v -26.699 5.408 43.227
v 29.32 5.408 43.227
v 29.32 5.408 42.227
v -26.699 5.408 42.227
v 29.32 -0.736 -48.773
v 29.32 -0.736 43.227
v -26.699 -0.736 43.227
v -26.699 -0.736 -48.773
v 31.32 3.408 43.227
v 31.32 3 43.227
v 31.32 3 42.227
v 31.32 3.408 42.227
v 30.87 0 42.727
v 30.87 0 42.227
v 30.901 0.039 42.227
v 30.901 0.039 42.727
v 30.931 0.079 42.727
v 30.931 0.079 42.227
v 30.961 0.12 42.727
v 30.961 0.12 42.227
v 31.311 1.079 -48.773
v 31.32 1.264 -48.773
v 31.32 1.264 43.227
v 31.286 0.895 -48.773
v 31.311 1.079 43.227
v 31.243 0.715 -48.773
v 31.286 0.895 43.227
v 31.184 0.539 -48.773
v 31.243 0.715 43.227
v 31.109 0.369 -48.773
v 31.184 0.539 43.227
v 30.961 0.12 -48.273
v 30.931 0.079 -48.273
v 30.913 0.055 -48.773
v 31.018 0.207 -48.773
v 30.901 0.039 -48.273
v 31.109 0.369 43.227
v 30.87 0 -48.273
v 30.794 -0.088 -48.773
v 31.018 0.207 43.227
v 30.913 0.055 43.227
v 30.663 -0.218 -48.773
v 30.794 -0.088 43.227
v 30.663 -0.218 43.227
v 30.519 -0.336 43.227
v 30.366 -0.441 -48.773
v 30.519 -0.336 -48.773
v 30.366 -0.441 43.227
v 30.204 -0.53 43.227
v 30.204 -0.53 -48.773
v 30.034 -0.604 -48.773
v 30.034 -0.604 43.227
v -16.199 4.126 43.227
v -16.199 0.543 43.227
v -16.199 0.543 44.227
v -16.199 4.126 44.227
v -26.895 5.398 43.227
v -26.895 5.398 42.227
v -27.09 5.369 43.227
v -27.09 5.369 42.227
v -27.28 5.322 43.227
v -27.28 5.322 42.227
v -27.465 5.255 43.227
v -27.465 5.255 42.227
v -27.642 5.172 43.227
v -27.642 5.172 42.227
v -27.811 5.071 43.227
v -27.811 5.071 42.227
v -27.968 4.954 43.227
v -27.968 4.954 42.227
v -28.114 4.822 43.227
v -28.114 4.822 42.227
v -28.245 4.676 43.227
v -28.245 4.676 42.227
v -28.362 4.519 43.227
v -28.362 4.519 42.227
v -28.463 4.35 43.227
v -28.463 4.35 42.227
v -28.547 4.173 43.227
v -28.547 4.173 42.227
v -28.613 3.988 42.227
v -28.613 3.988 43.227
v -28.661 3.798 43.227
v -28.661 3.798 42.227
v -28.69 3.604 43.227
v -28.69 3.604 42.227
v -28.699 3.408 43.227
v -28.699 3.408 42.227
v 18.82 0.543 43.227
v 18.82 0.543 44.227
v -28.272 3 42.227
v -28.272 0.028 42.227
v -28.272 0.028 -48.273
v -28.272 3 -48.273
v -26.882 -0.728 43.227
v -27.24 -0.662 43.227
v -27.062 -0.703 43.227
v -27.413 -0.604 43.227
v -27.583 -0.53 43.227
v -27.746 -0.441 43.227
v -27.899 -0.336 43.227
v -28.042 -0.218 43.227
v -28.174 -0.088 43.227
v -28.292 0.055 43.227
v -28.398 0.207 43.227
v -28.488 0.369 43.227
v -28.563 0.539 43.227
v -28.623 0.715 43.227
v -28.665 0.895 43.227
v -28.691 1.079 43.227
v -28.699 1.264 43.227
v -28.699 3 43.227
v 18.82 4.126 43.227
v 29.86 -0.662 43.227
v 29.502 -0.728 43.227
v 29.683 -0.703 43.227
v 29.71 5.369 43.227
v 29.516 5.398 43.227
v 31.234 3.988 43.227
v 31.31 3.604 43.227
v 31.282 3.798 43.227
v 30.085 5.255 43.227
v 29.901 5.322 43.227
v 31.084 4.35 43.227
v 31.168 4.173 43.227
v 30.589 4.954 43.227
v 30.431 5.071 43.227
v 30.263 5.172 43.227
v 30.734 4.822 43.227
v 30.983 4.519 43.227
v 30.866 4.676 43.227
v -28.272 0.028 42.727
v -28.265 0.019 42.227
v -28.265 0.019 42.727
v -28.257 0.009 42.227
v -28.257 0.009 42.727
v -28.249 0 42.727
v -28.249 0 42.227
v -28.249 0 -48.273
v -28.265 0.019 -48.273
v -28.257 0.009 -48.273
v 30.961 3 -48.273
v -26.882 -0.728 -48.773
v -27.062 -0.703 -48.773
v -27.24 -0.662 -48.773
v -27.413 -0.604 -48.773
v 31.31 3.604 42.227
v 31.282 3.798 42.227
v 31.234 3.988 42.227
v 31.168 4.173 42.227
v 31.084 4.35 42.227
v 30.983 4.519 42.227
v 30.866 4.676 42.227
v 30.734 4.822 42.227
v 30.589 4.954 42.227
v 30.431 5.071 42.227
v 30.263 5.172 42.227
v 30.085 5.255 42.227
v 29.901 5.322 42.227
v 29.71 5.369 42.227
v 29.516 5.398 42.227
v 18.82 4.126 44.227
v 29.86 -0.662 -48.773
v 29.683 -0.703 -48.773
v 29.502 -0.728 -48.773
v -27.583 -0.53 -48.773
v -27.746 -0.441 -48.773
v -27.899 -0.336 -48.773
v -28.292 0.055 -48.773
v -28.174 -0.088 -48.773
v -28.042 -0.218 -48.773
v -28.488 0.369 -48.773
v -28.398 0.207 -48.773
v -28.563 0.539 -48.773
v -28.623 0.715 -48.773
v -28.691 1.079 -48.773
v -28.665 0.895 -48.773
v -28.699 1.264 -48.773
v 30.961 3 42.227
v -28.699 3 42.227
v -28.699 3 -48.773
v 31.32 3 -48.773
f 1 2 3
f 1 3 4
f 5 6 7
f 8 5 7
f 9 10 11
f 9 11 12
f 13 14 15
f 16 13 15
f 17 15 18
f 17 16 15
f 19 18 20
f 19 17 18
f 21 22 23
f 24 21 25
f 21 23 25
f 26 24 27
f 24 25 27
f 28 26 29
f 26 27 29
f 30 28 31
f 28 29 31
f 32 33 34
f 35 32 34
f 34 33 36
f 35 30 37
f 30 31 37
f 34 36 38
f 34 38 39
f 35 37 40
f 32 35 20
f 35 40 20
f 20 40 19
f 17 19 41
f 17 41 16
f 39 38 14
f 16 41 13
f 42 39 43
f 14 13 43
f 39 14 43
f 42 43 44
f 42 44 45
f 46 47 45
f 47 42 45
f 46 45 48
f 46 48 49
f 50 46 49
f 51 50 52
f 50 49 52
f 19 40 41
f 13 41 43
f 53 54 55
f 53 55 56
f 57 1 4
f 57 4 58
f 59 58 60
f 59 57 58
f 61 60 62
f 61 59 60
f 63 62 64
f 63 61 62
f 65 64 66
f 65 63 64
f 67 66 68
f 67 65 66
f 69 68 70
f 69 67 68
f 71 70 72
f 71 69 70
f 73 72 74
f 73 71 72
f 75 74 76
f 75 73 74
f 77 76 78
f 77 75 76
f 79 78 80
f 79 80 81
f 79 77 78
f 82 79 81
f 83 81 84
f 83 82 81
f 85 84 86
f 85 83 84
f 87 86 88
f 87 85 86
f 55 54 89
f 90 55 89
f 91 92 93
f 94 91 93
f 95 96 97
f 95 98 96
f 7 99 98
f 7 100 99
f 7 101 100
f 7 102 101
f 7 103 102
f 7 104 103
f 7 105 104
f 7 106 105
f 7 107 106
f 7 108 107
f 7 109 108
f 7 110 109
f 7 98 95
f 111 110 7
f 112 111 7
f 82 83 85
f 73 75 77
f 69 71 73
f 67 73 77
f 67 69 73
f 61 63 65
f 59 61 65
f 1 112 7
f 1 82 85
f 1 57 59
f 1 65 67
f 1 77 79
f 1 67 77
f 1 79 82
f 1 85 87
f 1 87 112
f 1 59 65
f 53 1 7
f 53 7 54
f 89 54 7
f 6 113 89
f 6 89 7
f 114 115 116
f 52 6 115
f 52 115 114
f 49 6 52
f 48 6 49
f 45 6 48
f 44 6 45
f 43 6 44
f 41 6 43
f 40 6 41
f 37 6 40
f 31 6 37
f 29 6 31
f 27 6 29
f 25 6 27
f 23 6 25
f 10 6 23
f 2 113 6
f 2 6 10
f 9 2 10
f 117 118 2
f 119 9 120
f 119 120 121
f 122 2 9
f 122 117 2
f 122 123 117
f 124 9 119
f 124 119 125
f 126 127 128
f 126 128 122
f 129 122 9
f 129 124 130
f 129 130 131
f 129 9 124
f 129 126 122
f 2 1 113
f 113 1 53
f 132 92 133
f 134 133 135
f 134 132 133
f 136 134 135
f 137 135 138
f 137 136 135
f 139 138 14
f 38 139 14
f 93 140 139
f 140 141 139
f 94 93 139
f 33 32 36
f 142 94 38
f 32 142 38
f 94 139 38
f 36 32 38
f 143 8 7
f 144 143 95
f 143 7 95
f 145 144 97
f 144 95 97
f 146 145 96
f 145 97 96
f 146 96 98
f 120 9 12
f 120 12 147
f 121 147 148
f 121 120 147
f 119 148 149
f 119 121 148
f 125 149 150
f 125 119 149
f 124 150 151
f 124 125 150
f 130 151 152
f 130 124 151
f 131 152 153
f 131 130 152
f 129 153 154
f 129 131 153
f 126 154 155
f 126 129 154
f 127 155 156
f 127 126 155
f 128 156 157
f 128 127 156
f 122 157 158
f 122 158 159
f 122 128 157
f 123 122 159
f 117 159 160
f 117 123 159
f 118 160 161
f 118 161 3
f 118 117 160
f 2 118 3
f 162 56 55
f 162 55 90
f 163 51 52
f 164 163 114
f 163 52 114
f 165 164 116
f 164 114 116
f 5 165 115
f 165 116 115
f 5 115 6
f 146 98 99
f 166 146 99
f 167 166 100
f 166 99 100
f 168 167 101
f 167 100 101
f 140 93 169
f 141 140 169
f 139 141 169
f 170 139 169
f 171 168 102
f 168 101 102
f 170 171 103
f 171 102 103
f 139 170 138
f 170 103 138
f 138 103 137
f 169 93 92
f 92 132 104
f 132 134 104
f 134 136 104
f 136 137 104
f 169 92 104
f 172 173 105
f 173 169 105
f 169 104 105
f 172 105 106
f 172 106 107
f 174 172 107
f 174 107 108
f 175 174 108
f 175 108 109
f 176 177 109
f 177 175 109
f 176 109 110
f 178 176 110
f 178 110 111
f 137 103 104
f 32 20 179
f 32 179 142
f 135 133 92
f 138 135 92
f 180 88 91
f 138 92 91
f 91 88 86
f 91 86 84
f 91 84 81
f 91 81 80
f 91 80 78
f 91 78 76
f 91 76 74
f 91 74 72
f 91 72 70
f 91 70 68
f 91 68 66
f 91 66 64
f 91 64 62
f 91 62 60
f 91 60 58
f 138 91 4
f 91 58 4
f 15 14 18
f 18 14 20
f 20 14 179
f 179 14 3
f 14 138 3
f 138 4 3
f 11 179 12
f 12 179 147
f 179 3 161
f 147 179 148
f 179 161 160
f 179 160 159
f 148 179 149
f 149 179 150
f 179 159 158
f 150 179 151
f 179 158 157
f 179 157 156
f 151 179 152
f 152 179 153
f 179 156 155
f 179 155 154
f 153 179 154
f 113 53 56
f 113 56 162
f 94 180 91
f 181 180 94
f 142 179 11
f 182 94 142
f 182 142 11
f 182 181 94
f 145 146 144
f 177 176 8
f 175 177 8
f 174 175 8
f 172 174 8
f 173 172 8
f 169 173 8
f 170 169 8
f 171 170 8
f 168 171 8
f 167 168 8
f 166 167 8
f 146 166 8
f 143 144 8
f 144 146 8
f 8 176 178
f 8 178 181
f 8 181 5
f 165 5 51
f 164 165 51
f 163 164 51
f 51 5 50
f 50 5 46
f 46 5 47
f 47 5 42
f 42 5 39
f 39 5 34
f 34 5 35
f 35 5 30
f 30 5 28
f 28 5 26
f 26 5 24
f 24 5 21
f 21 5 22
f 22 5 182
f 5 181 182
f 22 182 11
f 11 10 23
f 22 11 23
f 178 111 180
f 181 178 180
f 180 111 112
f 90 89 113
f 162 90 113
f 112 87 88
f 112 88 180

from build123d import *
from build123d.topology import SkipClean

# Parameters (mm, degrees)
SKETCH2_W           = 60.23261123
SKETCH2_H           = 92
SKETCH2_W_2         = 59.23261123
SKETCH2_H_2         = 91
BOSS_EXTRUDE1_DEPTH = 3
SKETCH2_2_W         = 60.23261123
SKETCH2_2_H         = 92
BOSS_EXTRUDE2_DEPTH = 1
SKETCH3_W           = 35.019424251
SKETCH3_H           = 3.582680393
BOSS_EXTRUDE3_DEPTH = 1
BOSS_EXTRUDE5_DEPTH = 1
CUT_EXTRUDE2_DEPTH  = 98.380770332


with BuildPart() as part:
    # Sketch2 → Boss-Extrude1 (new body)
    with BuildSketch(Plane(origin=(0, 0, 0), x_dir=(1, 0, 0), z_dir=(0, 1, 0))):
        with Locations((1.344327409, 2.772982692)):
            Rectangle(SKETCH2_W, SKETCH2_H)
        with Locations((1.344327409, 2.772982692)):
            Rectangle(SKETCH2_W_2, SKETCH2_H_2, mode=Mode.SUBTRACT)
    extrude(amount=BOSS_EXTRUDE1_DEPTH)

    # Sketch2<2> → Boss-Extrude2 (add)
    with BuildSketch(Plane(origin=(0, 0, 0), x_dir=(1, 0, 0), z_dir=(0, 1, 0))):
        with Locations((1.344327409, 2.772982692)):
            Rectangle(SKETCH2_2_W, SKETCH2_2_H)
    extrude(amount=-BOSS_EXTRUDE2_DEPTH)

    # Sketch3 → Boss-Extrude3 (add)
    with BuildSketch(Plane.XY.offset(43.227017308)):
        with Locations((1.310252146, 2.334822514)):
            Rectangle(SKETCH3_W, SKETCH3_H)
    extrude(amount=BOSS_EXTRUDE3_DEPTH)

    # Sketch3<5> → Boss-Extrude5 (add)
    with BuildSketch(Plane.XY.offset(43.227017308)):
        with BuildLine():
            Line((29.319964272, 5.407679734), (-26.699459979, 5.407679734))
            ThreePointArc((-26.699459979, 5.407679734), (-28.113673542, 4.821893296), (-28.699459979, 3.407679734))
            Line((-28.699459979, 3.407679734), (-28.699459979, 1.263953606))
            ThreePointArc((-28.699459979, 1.263953606), (-28.113673542, -0.150259957), (-26.699459979, -0.736046394))
            Line((-26.699459979, -0.736046394), (29.319964272, -0.736046394))
            ThreePointArc((29.319964272, -0.736046394), (30.734177835, -0.150259957), (31.319964272, 1.263953606))
            Line((31.319964272, 1.263953606), (31.319964272, 3.407679734))
            ThreePointArc((31.319964272, 3.407679734), (30.734177835, 4.821893296), (29.319964272, 5.407679734))
        make_face()
    extrude(amount=-BOSS_EXTRUDE5_DEPTH)

    # Sketch3<6> → Cut-Extrude2 (cut, through all)
    with SkipClean():  # the faces are left unmerged after this step: merging them gives an invalid solid
        with BuildSketch(Plane.XY.offset(43.227017308)):
            with BuildLine():
                Line((31.460633024, 3), (31.319964272, 3))
                Line((31.319964272, 3), (31.319964272, 1.263953606))
                ThreePointArc((31.319964272, 1.263953606), (30.967290445, 0.129794675), (30.033647793, -0.604376085))
                ThreePointArc((30.033647793, -0.604376085), (29.682828309, -0.702853373), (29.319964272, -0.736046394))
                Line((29.319964272, -0.736046394), (-26.699459979, -0.736046394))
                ThreePointArc((-26.699459979, -0.736046394), (-27.062324016, -0.702853373), (-27.4131435, -0.604376085))
                ThreePointArc((-27.4131435, -0.604376085), (-28.346786152, 0.129794675), (-28.699459979, 1.263953606))
                Line((-28.699459979, 1.263953606), (-28.699459979, 3))
                Line((-28.699459979, 3), (-28.771978206, 3))
                Line((-28.771978206, 3), (-28.771978206, -1))
                Line((-28.771978206, -1), (31.460633024, -1))
                Line((31.460633024, -1), (31.460633024, 3))
            make_face()
        extrude(amount=-CUT_EXTRUDE2_DEPTH, mode=Mode.SUBTRACT)


solid = part.part
